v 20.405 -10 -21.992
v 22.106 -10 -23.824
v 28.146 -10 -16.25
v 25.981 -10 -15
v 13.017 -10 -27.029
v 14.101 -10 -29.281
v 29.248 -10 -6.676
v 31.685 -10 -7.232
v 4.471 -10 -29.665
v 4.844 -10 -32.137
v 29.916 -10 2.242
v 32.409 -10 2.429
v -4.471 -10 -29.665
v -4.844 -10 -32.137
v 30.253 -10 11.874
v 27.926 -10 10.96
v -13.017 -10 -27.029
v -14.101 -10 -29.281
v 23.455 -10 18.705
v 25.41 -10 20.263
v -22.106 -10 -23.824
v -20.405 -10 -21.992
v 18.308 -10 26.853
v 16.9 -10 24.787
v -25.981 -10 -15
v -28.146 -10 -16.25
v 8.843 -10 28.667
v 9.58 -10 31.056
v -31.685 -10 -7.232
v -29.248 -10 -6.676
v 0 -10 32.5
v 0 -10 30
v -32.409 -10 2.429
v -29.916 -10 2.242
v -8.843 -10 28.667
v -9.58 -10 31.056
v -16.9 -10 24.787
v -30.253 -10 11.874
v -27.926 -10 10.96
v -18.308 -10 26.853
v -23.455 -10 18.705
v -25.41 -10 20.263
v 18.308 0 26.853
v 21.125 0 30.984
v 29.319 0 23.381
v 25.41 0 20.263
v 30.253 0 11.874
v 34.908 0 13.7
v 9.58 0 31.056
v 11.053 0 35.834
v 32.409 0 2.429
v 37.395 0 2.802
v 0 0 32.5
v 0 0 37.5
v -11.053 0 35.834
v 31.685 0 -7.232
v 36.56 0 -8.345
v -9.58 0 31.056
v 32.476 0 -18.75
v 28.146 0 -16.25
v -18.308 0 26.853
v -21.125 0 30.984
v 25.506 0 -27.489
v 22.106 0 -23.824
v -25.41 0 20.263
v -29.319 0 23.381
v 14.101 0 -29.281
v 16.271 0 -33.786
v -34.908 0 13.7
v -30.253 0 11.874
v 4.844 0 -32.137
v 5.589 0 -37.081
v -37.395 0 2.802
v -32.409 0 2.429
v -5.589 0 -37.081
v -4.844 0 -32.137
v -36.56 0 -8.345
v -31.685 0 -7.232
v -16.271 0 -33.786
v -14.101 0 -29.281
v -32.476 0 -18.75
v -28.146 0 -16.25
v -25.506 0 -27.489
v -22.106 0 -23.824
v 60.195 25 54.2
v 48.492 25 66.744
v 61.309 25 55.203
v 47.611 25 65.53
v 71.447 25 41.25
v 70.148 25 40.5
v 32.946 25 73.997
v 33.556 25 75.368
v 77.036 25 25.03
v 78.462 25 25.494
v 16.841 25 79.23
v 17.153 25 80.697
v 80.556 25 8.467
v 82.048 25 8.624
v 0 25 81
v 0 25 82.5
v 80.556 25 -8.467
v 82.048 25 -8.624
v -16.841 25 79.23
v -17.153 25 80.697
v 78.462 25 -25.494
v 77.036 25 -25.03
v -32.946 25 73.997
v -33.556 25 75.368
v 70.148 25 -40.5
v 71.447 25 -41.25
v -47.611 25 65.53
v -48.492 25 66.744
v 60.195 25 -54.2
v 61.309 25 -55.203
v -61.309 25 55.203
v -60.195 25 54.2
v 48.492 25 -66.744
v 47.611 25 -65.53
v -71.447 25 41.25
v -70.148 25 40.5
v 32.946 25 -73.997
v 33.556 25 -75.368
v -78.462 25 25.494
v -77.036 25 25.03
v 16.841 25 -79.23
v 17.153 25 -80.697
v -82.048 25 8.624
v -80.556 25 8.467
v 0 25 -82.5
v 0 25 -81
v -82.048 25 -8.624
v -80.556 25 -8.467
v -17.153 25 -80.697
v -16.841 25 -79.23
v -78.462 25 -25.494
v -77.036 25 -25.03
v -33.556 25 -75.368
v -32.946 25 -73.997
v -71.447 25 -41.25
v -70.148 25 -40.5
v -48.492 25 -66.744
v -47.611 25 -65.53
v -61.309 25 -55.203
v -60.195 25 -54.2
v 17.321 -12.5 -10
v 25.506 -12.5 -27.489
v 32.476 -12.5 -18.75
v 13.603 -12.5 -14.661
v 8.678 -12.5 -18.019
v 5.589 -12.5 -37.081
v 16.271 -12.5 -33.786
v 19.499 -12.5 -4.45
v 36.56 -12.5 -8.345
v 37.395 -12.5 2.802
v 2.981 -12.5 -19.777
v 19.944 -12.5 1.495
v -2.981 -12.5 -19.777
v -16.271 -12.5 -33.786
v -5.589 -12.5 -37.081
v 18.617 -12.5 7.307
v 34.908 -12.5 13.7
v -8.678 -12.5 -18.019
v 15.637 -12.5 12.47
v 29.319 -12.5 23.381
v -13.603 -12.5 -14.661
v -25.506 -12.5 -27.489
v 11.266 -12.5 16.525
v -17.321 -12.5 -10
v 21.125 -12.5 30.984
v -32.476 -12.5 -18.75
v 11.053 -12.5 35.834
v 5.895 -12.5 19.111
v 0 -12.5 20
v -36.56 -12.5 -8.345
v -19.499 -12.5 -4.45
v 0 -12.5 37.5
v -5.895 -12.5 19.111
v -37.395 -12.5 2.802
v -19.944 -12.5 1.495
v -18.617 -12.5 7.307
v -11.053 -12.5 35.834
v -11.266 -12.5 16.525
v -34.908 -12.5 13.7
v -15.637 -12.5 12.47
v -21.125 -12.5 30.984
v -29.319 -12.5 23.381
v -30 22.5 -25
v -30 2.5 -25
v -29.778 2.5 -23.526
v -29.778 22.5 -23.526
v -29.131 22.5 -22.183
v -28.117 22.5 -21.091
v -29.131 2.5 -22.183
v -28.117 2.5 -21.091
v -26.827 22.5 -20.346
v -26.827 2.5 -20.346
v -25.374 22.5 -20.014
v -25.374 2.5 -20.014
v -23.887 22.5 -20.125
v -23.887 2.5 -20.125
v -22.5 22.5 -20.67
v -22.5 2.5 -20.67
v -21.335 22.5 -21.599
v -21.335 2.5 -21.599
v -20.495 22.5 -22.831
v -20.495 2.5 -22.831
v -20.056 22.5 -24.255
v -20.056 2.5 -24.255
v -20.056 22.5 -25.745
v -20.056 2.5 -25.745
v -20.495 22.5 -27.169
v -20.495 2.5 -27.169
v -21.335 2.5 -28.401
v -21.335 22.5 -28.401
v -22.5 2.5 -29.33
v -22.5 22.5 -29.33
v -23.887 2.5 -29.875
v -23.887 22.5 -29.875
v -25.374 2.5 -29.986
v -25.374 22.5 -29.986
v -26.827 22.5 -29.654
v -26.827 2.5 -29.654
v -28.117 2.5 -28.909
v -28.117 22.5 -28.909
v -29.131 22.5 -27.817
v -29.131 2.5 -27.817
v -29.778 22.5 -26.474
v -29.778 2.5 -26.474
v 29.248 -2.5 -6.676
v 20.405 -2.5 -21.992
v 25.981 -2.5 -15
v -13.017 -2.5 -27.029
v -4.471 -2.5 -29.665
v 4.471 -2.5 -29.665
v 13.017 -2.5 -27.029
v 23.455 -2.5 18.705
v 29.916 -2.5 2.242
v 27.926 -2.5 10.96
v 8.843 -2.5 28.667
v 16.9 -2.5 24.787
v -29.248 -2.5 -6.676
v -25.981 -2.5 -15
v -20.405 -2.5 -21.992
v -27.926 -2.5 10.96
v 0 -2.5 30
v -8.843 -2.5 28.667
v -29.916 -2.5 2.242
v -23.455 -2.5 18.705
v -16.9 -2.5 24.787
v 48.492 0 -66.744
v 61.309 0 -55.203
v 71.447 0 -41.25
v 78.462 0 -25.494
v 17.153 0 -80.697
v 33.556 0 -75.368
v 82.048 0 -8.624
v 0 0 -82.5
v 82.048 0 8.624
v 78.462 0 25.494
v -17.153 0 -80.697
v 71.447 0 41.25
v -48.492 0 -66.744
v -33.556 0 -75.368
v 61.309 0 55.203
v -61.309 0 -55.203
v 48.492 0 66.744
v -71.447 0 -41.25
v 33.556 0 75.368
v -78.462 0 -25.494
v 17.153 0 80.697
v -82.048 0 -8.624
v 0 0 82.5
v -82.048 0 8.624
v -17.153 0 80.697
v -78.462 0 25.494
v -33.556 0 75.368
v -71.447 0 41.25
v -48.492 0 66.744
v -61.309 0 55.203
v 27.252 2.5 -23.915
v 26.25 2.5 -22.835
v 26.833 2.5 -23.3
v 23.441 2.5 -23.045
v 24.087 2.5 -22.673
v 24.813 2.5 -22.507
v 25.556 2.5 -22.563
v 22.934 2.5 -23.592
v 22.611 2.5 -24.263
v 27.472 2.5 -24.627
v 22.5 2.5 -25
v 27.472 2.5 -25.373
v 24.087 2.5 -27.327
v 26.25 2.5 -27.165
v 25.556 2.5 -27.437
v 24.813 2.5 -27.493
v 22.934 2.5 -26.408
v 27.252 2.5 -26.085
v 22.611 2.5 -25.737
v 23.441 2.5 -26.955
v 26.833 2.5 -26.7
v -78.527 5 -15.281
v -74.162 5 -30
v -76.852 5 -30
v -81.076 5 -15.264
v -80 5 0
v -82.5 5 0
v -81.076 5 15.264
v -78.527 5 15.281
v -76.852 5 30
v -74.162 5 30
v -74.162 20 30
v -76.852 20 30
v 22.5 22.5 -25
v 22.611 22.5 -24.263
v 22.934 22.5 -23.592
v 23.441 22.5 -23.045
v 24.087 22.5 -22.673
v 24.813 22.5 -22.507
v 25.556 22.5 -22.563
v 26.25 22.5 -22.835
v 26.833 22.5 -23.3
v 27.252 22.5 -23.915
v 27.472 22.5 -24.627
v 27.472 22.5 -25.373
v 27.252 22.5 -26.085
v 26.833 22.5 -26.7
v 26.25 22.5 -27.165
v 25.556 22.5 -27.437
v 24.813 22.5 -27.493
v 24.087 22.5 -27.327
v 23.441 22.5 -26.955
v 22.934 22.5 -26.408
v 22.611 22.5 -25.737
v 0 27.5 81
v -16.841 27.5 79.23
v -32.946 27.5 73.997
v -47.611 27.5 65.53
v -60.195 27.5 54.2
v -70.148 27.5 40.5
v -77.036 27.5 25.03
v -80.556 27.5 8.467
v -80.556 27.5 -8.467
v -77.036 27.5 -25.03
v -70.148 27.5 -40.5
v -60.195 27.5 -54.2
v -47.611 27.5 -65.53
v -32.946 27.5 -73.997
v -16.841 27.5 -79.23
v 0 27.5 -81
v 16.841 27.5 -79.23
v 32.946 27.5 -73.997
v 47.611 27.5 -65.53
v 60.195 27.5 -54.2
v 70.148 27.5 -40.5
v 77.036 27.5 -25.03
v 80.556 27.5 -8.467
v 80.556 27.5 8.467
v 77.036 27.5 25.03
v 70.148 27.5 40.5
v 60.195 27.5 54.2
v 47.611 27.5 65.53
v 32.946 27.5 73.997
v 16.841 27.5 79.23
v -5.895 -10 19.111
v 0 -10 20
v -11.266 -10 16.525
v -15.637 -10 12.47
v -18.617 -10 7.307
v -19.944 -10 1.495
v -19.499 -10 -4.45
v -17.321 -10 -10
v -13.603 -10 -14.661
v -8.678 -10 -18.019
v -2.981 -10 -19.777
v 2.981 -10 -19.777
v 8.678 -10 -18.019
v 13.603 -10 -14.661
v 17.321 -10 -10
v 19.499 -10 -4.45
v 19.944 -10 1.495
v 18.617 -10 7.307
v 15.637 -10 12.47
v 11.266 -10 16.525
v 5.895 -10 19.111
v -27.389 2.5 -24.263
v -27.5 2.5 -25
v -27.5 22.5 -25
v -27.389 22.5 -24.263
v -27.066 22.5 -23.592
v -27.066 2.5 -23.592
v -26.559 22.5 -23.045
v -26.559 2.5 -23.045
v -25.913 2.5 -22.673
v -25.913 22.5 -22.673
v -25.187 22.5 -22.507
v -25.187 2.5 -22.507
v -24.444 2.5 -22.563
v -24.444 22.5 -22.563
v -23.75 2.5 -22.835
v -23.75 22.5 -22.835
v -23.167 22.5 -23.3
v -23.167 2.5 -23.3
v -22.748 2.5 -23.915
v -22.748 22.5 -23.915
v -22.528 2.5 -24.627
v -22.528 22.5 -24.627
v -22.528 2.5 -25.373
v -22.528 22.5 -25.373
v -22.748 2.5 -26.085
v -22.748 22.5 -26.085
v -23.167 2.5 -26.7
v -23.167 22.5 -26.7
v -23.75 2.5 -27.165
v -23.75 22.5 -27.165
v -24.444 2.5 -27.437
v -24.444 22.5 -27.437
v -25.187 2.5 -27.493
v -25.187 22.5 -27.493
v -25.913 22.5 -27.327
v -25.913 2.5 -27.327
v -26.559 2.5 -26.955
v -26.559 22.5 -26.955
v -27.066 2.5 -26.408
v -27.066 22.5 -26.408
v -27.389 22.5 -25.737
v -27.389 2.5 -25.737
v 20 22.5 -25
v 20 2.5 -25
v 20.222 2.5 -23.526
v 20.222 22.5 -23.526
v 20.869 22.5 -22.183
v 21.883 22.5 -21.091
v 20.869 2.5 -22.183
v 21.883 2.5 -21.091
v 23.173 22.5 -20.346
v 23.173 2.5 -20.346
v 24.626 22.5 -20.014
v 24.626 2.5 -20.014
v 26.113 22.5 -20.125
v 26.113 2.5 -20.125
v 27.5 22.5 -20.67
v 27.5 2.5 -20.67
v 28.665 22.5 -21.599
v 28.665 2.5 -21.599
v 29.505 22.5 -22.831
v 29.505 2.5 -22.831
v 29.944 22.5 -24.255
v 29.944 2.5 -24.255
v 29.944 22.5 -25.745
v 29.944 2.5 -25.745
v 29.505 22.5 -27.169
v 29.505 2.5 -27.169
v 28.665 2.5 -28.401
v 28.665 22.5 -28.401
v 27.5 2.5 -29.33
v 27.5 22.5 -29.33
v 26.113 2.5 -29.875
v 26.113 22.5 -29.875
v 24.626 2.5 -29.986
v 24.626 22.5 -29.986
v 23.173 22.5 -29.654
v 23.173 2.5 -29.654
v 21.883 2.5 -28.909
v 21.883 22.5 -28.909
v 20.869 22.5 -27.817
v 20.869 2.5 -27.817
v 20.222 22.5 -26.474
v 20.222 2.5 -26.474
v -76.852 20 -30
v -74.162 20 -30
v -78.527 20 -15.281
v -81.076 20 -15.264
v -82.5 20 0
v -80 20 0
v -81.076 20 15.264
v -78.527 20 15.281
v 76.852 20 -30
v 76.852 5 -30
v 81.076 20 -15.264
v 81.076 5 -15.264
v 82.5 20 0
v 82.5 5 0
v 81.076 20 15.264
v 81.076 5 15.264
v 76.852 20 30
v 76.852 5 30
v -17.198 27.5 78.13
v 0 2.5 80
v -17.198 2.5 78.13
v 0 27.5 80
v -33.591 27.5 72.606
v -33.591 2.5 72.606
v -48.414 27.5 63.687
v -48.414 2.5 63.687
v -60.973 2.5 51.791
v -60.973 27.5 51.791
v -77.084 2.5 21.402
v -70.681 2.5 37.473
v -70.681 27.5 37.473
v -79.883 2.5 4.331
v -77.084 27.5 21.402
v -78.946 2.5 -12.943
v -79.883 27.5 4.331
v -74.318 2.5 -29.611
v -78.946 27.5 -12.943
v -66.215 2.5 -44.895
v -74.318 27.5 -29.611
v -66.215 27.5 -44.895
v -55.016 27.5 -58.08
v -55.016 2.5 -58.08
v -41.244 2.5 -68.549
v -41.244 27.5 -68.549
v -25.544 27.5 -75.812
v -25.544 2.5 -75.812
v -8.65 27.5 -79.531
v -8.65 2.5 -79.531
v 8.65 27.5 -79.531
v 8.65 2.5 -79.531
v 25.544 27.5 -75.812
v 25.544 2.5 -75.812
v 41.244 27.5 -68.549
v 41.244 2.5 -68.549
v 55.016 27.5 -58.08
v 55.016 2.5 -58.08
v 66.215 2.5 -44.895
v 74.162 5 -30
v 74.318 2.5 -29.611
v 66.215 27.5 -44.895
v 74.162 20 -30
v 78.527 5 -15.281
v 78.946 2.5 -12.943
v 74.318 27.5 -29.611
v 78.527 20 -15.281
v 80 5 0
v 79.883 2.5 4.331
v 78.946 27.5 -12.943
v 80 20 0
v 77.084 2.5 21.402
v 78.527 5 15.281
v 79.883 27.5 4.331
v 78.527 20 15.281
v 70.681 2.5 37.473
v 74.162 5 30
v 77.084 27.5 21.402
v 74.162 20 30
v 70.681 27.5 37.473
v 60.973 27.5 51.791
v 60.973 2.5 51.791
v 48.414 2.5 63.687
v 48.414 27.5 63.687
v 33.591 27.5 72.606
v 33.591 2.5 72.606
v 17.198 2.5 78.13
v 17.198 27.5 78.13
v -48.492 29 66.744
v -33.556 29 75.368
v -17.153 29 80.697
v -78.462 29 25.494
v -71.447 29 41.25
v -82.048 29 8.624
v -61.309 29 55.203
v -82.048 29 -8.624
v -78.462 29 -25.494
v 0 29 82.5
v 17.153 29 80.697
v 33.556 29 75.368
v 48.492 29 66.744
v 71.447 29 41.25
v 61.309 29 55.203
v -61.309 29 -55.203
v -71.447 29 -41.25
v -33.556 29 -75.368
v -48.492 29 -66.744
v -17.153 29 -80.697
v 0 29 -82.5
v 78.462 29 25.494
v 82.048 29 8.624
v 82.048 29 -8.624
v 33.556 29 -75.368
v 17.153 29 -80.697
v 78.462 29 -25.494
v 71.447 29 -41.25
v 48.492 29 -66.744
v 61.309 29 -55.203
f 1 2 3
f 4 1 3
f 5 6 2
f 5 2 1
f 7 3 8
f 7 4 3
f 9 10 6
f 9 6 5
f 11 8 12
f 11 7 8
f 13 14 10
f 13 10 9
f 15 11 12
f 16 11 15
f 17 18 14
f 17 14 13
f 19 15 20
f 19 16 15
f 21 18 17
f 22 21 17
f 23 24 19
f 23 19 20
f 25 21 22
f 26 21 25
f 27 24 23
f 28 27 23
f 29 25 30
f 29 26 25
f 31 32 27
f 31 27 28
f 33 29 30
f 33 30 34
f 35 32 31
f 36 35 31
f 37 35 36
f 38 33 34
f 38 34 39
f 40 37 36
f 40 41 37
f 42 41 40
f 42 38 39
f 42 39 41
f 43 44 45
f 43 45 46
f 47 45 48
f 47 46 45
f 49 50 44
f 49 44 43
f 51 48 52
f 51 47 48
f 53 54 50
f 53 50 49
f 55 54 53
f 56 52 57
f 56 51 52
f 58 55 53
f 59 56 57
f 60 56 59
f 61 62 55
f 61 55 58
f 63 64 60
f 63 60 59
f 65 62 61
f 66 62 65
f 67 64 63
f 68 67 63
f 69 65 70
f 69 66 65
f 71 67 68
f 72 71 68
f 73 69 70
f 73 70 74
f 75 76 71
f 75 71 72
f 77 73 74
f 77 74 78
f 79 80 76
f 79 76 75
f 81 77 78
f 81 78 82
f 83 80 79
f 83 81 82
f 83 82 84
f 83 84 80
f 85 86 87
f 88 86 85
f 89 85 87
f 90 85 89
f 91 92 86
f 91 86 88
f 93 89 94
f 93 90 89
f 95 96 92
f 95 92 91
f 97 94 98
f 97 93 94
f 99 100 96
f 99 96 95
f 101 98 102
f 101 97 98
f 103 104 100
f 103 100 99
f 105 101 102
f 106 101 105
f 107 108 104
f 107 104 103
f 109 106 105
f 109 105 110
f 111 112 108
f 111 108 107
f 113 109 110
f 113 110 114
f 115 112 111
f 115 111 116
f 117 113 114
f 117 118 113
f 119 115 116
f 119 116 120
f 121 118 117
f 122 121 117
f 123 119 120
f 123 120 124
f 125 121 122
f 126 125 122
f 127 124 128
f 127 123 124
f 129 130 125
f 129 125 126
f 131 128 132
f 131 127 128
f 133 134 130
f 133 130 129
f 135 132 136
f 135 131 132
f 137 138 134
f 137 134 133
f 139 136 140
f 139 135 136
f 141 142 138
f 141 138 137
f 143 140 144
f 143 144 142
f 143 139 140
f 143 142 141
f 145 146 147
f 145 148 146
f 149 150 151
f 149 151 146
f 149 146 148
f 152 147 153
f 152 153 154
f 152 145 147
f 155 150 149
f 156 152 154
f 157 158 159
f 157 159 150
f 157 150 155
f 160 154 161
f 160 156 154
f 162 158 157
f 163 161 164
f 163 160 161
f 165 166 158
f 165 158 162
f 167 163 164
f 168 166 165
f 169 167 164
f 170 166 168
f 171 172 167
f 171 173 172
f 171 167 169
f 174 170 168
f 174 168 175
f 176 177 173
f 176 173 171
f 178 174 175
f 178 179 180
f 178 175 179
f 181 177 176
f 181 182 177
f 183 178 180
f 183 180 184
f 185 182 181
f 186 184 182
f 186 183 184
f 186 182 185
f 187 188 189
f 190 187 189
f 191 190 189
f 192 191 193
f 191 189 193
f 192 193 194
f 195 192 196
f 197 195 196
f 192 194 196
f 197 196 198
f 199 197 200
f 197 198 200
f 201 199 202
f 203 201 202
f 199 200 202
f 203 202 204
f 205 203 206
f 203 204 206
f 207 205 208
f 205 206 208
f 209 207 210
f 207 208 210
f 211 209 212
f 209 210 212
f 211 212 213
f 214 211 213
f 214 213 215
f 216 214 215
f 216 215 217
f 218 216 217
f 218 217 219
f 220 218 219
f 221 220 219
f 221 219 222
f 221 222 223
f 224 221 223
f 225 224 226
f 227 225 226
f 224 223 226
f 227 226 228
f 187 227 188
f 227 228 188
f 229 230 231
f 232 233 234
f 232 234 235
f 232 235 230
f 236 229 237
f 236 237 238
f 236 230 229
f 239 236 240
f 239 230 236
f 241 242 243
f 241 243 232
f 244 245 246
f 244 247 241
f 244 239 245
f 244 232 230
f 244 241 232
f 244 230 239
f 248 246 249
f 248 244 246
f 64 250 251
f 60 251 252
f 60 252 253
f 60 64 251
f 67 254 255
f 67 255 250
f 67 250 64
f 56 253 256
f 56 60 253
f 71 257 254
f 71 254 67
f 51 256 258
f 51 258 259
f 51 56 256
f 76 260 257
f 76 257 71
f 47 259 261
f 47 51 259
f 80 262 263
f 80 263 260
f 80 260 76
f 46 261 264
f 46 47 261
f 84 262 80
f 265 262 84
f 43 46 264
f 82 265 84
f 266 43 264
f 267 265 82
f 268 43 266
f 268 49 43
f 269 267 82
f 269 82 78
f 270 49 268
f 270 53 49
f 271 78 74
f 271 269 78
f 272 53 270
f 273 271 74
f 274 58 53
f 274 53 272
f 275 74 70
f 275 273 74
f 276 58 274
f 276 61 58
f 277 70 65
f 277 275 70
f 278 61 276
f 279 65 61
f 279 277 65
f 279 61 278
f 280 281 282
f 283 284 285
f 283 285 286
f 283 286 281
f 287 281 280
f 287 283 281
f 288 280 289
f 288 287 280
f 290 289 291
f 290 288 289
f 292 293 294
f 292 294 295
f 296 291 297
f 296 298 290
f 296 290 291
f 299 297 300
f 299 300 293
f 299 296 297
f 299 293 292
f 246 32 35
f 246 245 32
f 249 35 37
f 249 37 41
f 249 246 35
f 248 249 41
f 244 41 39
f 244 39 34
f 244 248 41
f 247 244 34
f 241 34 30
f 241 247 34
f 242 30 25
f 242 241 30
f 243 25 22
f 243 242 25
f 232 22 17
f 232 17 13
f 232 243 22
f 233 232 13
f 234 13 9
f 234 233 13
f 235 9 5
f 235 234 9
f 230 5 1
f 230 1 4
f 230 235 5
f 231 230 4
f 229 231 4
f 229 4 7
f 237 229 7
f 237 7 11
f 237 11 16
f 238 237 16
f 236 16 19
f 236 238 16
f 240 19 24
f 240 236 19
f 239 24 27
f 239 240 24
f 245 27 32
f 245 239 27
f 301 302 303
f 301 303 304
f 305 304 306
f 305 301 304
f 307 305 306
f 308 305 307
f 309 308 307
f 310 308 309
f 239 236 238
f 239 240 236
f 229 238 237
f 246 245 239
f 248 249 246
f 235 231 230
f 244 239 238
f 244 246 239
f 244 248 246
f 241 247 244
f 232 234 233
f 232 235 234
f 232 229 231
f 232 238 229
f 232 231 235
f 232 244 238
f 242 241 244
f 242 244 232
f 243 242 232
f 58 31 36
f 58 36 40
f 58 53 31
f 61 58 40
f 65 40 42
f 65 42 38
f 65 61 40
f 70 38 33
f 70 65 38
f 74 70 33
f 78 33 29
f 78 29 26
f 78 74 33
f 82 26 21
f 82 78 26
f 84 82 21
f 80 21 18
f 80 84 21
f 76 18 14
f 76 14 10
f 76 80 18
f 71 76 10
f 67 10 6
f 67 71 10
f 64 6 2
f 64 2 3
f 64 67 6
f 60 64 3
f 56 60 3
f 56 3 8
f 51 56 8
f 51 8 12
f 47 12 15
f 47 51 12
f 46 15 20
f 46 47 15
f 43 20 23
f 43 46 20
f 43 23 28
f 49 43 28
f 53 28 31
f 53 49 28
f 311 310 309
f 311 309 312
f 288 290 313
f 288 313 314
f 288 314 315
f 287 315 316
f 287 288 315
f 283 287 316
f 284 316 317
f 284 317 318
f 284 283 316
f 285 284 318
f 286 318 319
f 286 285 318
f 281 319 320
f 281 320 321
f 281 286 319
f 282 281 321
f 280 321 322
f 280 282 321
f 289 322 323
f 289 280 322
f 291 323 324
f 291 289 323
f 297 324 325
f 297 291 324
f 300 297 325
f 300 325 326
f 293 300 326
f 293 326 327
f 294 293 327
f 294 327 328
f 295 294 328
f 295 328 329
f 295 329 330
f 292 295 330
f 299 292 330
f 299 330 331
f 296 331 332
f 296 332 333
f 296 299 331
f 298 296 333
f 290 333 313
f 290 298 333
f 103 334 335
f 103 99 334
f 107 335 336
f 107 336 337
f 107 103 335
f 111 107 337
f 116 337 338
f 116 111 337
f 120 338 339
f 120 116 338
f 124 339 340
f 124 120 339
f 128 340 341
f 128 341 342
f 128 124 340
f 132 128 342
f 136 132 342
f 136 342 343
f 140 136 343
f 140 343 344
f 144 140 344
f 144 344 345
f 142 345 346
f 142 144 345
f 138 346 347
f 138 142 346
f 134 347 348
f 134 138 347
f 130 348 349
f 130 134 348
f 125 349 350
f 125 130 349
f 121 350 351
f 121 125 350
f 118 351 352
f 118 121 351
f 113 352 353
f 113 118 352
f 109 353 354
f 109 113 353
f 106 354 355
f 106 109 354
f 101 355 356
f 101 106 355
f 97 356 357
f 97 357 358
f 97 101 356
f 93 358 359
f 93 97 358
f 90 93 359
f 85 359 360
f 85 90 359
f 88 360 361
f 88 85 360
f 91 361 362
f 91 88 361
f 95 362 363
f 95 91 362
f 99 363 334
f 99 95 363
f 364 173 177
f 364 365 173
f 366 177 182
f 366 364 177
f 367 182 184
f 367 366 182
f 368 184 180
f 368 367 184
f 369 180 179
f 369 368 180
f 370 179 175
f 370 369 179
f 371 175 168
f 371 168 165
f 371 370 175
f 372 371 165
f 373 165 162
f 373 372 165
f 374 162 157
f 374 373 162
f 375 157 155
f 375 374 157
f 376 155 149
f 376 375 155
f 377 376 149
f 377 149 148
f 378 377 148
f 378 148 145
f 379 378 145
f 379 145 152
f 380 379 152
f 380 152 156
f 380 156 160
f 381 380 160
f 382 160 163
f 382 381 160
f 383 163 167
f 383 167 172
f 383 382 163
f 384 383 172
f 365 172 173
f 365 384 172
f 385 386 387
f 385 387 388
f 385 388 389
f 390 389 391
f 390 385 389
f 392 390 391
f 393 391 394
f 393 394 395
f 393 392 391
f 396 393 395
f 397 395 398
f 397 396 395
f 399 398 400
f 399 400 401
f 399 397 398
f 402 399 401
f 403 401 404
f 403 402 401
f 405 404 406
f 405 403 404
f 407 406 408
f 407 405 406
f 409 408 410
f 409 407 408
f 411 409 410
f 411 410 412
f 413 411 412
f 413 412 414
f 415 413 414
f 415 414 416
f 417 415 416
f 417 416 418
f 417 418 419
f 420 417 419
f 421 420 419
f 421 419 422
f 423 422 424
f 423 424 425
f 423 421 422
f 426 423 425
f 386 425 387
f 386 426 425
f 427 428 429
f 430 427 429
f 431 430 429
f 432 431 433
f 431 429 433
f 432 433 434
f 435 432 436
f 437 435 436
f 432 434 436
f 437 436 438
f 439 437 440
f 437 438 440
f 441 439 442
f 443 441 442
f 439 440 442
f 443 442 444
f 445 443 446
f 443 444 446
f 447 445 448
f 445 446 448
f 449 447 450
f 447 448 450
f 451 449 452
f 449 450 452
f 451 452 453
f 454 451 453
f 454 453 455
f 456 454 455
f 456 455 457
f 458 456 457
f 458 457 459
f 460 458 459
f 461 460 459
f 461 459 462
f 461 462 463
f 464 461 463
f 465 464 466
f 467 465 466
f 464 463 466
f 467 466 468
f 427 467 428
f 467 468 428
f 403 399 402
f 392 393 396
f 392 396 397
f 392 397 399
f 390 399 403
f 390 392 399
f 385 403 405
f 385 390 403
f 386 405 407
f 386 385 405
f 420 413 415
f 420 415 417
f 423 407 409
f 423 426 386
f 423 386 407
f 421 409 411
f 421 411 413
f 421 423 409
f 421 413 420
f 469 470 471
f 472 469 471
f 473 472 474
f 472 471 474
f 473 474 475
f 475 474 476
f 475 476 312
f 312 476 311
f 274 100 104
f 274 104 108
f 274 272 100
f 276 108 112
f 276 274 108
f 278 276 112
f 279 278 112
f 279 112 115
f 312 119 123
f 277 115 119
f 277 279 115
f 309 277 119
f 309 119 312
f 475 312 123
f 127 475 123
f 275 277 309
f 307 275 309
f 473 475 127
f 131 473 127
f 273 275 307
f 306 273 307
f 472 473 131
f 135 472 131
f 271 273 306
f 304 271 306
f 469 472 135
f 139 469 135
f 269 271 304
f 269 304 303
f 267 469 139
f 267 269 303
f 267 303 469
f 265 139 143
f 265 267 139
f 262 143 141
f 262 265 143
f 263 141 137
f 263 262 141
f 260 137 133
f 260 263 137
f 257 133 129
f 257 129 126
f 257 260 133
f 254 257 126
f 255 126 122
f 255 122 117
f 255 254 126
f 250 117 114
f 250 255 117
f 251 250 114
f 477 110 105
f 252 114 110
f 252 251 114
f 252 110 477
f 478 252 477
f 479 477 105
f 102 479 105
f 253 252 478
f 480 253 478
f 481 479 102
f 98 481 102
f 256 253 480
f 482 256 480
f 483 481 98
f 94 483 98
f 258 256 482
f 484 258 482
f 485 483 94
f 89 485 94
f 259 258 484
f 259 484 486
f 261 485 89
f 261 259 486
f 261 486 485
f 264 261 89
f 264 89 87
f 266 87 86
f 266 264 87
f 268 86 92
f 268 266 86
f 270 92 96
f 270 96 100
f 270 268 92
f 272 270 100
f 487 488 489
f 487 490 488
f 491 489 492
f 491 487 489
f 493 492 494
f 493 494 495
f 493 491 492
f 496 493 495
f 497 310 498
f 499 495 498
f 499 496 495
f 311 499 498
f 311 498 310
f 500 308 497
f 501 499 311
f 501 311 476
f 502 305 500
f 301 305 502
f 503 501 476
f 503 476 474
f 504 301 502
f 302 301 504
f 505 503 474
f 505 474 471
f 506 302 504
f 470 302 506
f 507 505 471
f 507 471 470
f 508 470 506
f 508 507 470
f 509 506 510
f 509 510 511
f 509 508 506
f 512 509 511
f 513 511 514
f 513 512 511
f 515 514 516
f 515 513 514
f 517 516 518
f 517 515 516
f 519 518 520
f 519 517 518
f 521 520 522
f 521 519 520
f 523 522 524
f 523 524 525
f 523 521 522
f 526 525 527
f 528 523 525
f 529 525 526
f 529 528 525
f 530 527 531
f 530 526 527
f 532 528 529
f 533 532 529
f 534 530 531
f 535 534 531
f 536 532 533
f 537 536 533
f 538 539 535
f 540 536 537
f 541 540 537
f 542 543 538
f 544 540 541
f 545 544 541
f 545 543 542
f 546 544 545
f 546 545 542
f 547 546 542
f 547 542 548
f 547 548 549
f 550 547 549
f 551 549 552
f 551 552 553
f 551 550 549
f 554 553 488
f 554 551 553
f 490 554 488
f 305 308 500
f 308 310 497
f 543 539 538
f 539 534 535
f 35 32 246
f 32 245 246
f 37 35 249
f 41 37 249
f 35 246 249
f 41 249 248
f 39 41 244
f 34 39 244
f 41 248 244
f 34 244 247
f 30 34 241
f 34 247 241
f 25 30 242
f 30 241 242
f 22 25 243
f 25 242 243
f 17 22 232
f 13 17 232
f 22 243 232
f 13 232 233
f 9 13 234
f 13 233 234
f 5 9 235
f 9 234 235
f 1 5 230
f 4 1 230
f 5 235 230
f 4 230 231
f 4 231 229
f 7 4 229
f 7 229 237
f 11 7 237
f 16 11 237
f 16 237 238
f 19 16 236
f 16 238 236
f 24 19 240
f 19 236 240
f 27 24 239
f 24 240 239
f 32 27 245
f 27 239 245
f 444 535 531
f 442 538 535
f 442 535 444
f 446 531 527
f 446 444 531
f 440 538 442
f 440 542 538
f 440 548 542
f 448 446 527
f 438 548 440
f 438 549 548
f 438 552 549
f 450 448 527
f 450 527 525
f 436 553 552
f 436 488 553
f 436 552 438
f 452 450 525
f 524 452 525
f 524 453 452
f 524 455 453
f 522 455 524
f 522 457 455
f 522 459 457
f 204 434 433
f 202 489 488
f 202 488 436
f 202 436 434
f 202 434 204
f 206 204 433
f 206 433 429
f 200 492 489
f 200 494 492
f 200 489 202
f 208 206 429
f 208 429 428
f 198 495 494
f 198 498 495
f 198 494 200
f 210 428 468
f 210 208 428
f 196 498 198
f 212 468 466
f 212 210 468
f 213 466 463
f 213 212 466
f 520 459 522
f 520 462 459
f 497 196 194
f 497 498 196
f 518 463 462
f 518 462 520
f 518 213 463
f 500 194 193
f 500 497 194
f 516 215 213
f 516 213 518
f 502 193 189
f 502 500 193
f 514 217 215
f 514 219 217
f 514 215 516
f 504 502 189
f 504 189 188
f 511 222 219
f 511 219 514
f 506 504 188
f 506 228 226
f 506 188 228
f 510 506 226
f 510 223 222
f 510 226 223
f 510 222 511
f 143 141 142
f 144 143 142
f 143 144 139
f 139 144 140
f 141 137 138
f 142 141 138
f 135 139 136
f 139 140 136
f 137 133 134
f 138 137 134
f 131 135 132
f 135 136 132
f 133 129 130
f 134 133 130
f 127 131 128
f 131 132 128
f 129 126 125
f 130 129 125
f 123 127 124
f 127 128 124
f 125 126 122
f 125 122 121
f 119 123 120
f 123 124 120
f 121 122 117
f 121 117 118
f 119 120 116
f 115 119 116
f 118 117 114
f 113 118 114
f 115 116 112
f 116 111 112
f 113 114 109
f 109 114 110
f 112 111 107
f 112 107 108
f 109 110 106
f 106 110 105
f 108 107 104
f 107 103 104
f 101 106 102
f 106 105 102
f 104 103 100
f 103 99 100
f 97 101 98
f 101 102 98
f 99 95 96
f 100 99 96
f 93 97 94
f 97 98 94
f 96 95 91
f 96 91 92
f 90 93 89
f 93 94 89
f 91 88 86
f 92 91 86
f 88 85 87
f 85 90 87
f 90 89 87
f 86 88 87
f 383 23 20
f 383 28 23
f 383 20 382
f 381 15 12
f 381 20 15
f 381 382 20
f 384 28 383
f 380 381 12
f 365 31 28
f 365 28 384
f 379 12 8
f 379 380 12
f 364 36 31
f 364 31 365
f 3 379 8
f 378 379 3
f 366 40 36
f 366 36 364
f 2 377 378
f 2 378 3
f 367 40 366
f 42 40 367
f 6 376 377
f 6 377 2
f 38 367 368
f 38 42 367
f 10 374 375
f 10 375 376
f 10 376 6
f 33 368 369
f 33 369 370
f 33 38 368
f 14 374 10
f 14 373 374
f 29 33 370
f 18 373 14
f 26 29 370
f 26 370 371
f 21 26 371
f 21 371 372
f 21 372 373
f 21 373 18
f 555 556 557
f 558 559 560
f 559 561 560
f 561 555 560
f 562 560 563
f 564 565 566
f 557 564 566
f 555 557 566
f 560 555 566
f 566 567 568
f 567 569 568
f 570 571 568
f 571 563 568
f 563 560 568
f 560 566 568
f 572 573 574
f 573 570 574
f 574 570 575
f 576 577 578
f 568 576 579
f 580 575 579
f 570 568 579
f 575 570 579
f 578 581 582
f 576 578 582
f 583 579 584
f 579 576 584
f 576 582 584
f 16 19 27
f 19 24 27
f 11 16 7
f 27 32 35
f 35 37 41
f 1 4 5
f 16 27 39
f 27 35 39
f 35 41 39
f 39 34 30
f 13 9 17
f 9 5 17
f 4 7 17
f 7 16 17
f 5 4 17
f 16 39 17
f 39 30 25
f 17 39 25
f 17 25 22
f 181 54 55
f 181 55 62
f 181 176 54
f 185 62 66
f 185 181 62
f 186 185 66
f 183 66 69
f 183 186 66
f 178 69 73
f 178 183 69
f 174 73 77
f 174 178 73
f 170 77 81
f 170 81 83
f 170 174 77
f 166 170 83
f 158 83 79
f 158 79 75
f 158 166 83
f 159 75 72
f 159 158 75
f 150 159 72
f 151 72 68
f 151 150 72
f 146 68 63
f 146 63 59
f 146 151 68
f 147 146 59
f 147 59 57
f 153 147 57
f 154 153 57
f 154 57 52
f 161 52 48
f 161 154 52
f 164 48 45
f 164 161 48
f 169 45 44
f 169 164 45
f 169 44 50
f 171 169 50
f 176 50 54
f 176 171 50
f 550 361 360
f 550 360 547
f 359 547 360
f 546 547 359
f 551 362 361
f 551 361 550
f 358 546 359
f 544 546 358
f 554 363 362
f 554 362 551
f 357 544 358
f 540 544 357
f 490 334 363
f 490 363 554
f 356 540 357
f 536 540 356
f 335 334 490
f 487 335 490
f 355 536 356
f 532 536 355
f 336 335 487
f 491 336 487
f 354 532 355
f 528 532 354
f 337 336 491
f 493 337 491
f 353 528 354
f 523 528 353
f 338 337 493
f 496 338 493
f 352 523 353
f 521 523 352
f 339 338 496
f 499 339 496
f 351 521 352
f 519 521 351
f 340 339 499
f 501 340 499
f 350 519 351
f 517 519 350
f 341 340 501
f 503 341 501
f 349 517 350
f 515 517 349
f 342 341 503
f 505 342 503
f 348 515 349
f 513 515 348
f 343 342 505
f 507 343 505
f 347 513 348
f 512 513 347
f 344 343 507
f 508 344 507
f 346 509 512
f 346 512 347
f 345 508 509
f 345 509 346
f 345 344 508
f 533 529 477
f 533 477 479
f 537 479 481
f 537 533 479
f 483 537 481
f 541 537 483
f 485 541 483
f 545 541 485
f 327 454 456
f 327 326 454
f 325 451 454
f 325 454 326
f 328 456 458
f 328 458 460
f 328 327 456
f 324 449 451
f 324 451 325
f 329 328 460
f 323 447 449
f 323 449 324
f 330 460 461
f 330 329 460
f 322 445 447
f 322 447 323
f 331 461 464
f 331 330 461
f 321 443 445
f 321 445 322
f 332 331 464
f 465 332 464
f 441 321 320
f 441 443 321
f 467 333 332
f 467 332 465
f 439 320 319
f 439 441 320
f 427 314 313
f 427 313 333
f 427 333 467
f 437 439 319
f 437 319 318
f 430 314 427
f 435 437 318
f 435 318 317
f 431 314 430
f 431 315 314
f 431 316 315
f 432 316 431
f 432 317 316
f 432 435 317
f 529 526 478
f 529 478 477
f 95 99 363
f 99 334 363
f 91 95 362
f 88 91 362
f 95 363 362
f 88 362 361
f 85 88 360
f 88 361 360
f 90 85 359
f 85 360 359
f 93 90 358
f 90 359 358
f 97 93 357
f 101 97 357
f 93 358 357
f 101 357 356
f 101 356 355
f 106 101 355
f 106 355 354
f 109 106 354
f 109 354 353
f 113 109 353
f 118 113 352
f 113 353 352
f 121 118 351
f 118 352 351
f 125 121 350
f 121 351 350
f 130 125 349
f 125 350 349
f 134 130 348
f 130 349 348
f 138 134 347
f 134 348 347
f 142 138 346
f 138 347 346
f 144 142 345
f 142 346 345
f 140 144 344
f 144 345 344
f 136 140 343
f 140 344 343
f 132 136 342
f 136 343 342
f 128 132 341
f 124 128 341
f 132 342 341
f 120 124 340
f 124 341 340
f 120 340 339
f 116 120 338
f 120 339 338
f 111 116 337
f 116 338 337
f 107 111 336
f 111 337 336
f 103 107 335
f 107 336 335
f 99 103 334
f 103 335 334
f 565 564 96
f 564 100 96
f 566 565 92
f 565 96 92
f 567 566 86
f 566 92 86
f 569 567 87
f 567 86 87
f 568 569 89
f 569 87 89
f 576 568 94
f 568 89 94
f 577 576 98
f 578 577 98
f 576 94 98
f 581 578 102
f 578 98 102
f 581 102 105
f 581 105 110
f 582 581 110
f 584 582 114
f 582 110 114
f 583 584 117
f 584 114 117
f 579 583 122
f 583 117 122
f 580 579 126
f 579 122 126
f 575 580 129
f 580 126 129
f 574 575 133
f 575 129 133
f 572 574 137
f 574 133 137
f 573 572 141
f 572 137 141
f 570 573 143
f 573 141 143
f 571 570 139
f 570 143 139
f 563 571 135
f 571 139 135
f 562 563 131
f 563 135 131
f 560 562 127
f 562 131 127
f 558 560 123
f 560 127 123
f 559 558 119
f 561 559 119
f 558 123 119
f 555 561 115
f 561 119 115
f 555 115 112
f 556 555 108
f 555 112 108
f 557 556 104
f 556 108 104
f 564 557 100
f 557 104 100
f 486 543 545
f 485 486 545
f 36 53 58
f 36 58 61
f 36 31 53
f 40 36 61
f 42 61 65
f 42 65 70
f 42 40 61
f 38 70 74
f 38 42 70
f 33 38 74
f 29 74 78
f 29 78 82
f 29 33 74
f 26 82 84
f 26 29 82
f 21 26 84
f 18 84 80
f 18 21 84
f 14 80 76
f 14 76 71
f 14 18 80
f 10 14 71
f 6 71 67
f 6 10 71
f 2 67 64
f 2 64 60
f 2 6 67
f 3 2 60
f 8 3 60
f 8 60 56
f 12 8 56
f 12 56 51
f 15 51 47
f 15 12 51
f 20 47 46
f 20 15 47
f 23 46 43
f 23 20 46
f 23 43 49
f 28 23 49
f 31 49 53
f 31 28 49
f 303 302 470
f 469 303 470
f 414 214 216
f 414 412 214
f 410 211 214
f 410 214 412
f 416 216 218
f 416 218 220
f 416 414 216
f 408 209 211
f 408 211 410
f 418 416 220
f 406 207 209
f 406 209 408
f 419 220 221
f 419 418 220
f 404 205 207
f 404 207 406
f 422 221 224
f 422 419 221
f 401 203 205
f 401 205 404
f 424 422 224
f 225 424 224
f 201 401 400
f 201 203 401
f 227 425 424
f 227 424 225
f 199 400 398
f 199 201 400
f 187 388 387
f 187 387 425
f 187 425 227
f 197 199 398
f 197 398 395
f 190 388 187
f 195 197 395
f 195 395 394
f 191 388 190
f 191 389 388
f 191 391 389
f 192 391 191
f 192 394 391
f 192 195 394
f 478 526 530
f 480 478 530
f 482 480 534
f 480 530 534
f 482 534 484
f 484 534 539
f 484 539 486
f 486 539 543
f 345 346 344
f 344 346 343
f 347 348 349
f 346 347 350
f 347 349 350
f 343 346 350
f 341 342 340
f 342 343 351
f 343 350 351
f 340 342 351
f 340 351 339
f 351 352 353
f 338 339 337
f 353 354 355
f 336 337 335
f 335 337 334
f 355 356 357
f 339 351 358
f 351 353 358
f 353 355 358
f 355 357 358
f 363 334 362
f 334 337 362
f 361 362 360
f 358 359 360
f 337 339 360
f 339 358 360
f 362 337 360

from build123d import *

# Parameters (mm, degrees)
F2_W          = 7.5
F2_H          = 30
F8_W          = 15
F8_H          = 60
F9_DEPTH      = 82.501
F9_DEPTH_BACK = 82.501
F10_R         = 5
F10_R_2       = 2.5
F11_DEPTH     = 20


with BuildPart() as f4:
    # F0 (on Right) → F4 (revolve)
    with BuildSketch(Plane.YZ):
        Polygon((-2.5, 0), (0, 0), (2.5, 0), (2.5, 80), (25, 80), (27.5, 80), (27.5, 81), (25, 81), (25, 82.5), (0, 82.5), (0, 32.5), (-10, 32.5), (-10, 30), (-2.5, 30), align=None)
    revolve(axis=Axis((0, -27.8425812721, 0), (0, -1, 0)))

    # F8 (on Right) → F9 (cut, two sides)
    with BuildSketch(Plane.YZ) as f9_sk:
        with Locations((12.5, 0)):
            Rectangle(F8_W, F8_H)
    extrude(amount=-F9_DEPTH, mode=Mode.SUBTRACT)
    extrude(f9_sk.sketch, amount=F9_DEPTH_BACK, mode=Mode.SUBTRACT)

    # F10 (on face) → F11 (join)
    with BuildSketch(Plane(origin=(0, 2.5, 0), x_dir=(-1, 0, 0), z_dir=(0, 1, 0))):
        with Locations((-25, -25)):
            Circle(F10_R)
        with Locations((-25, -25)):
            Circle(F10_R_2, mode=Mode.SUBTRACT)
        with Locations((25, -25)):
            Circle(F10_R)
        with Locations((25, -25)):
            Circle(F10_R_2, mode=Mode.SUBTRACT)
    extrude(amount=F11_DEPTH)


with BuildPart() as f5:
    # F1 (on Right) → F5 (revolve)
    with BuildSketch(Plane.YZ):
        Polygon((-10, 32.5), (0, 32.5), (0, 37.5), (-12.5, 37.5), (-12.5, 20), (-10, 20), align=None)
    revolve(axis=Axis((0, -42.0060493052, 0), (0, -1, 0)))


with BuildPart() as f6:
    # F3 (on Right) → F6 (revolve)
    with BuildSketch(Plane.YZ):
        Polygon((27.5, 79.2950615287), (27.5, 0), (29, 0), (29, 82.5), (25, 82.5), (25, 81), (27.5, 81), align=None)
    revolve(axis=Axis((0, 18.4876341373, 0), (0, 1, 0)))


with BuildPart() as f7:
    # F2 (on Right) → F7 (revolve)
    with BuildSketch(Plane.YZ):
        with Locations((-6.25, 15)):
            Rectangle(F2_W, F2_H)
    revolve(axis=Axis((0, -27.8425812721, 0), (0, -1, 0)))


solid = Compound([f4.part, f5.part, f6.part, f7.part])
